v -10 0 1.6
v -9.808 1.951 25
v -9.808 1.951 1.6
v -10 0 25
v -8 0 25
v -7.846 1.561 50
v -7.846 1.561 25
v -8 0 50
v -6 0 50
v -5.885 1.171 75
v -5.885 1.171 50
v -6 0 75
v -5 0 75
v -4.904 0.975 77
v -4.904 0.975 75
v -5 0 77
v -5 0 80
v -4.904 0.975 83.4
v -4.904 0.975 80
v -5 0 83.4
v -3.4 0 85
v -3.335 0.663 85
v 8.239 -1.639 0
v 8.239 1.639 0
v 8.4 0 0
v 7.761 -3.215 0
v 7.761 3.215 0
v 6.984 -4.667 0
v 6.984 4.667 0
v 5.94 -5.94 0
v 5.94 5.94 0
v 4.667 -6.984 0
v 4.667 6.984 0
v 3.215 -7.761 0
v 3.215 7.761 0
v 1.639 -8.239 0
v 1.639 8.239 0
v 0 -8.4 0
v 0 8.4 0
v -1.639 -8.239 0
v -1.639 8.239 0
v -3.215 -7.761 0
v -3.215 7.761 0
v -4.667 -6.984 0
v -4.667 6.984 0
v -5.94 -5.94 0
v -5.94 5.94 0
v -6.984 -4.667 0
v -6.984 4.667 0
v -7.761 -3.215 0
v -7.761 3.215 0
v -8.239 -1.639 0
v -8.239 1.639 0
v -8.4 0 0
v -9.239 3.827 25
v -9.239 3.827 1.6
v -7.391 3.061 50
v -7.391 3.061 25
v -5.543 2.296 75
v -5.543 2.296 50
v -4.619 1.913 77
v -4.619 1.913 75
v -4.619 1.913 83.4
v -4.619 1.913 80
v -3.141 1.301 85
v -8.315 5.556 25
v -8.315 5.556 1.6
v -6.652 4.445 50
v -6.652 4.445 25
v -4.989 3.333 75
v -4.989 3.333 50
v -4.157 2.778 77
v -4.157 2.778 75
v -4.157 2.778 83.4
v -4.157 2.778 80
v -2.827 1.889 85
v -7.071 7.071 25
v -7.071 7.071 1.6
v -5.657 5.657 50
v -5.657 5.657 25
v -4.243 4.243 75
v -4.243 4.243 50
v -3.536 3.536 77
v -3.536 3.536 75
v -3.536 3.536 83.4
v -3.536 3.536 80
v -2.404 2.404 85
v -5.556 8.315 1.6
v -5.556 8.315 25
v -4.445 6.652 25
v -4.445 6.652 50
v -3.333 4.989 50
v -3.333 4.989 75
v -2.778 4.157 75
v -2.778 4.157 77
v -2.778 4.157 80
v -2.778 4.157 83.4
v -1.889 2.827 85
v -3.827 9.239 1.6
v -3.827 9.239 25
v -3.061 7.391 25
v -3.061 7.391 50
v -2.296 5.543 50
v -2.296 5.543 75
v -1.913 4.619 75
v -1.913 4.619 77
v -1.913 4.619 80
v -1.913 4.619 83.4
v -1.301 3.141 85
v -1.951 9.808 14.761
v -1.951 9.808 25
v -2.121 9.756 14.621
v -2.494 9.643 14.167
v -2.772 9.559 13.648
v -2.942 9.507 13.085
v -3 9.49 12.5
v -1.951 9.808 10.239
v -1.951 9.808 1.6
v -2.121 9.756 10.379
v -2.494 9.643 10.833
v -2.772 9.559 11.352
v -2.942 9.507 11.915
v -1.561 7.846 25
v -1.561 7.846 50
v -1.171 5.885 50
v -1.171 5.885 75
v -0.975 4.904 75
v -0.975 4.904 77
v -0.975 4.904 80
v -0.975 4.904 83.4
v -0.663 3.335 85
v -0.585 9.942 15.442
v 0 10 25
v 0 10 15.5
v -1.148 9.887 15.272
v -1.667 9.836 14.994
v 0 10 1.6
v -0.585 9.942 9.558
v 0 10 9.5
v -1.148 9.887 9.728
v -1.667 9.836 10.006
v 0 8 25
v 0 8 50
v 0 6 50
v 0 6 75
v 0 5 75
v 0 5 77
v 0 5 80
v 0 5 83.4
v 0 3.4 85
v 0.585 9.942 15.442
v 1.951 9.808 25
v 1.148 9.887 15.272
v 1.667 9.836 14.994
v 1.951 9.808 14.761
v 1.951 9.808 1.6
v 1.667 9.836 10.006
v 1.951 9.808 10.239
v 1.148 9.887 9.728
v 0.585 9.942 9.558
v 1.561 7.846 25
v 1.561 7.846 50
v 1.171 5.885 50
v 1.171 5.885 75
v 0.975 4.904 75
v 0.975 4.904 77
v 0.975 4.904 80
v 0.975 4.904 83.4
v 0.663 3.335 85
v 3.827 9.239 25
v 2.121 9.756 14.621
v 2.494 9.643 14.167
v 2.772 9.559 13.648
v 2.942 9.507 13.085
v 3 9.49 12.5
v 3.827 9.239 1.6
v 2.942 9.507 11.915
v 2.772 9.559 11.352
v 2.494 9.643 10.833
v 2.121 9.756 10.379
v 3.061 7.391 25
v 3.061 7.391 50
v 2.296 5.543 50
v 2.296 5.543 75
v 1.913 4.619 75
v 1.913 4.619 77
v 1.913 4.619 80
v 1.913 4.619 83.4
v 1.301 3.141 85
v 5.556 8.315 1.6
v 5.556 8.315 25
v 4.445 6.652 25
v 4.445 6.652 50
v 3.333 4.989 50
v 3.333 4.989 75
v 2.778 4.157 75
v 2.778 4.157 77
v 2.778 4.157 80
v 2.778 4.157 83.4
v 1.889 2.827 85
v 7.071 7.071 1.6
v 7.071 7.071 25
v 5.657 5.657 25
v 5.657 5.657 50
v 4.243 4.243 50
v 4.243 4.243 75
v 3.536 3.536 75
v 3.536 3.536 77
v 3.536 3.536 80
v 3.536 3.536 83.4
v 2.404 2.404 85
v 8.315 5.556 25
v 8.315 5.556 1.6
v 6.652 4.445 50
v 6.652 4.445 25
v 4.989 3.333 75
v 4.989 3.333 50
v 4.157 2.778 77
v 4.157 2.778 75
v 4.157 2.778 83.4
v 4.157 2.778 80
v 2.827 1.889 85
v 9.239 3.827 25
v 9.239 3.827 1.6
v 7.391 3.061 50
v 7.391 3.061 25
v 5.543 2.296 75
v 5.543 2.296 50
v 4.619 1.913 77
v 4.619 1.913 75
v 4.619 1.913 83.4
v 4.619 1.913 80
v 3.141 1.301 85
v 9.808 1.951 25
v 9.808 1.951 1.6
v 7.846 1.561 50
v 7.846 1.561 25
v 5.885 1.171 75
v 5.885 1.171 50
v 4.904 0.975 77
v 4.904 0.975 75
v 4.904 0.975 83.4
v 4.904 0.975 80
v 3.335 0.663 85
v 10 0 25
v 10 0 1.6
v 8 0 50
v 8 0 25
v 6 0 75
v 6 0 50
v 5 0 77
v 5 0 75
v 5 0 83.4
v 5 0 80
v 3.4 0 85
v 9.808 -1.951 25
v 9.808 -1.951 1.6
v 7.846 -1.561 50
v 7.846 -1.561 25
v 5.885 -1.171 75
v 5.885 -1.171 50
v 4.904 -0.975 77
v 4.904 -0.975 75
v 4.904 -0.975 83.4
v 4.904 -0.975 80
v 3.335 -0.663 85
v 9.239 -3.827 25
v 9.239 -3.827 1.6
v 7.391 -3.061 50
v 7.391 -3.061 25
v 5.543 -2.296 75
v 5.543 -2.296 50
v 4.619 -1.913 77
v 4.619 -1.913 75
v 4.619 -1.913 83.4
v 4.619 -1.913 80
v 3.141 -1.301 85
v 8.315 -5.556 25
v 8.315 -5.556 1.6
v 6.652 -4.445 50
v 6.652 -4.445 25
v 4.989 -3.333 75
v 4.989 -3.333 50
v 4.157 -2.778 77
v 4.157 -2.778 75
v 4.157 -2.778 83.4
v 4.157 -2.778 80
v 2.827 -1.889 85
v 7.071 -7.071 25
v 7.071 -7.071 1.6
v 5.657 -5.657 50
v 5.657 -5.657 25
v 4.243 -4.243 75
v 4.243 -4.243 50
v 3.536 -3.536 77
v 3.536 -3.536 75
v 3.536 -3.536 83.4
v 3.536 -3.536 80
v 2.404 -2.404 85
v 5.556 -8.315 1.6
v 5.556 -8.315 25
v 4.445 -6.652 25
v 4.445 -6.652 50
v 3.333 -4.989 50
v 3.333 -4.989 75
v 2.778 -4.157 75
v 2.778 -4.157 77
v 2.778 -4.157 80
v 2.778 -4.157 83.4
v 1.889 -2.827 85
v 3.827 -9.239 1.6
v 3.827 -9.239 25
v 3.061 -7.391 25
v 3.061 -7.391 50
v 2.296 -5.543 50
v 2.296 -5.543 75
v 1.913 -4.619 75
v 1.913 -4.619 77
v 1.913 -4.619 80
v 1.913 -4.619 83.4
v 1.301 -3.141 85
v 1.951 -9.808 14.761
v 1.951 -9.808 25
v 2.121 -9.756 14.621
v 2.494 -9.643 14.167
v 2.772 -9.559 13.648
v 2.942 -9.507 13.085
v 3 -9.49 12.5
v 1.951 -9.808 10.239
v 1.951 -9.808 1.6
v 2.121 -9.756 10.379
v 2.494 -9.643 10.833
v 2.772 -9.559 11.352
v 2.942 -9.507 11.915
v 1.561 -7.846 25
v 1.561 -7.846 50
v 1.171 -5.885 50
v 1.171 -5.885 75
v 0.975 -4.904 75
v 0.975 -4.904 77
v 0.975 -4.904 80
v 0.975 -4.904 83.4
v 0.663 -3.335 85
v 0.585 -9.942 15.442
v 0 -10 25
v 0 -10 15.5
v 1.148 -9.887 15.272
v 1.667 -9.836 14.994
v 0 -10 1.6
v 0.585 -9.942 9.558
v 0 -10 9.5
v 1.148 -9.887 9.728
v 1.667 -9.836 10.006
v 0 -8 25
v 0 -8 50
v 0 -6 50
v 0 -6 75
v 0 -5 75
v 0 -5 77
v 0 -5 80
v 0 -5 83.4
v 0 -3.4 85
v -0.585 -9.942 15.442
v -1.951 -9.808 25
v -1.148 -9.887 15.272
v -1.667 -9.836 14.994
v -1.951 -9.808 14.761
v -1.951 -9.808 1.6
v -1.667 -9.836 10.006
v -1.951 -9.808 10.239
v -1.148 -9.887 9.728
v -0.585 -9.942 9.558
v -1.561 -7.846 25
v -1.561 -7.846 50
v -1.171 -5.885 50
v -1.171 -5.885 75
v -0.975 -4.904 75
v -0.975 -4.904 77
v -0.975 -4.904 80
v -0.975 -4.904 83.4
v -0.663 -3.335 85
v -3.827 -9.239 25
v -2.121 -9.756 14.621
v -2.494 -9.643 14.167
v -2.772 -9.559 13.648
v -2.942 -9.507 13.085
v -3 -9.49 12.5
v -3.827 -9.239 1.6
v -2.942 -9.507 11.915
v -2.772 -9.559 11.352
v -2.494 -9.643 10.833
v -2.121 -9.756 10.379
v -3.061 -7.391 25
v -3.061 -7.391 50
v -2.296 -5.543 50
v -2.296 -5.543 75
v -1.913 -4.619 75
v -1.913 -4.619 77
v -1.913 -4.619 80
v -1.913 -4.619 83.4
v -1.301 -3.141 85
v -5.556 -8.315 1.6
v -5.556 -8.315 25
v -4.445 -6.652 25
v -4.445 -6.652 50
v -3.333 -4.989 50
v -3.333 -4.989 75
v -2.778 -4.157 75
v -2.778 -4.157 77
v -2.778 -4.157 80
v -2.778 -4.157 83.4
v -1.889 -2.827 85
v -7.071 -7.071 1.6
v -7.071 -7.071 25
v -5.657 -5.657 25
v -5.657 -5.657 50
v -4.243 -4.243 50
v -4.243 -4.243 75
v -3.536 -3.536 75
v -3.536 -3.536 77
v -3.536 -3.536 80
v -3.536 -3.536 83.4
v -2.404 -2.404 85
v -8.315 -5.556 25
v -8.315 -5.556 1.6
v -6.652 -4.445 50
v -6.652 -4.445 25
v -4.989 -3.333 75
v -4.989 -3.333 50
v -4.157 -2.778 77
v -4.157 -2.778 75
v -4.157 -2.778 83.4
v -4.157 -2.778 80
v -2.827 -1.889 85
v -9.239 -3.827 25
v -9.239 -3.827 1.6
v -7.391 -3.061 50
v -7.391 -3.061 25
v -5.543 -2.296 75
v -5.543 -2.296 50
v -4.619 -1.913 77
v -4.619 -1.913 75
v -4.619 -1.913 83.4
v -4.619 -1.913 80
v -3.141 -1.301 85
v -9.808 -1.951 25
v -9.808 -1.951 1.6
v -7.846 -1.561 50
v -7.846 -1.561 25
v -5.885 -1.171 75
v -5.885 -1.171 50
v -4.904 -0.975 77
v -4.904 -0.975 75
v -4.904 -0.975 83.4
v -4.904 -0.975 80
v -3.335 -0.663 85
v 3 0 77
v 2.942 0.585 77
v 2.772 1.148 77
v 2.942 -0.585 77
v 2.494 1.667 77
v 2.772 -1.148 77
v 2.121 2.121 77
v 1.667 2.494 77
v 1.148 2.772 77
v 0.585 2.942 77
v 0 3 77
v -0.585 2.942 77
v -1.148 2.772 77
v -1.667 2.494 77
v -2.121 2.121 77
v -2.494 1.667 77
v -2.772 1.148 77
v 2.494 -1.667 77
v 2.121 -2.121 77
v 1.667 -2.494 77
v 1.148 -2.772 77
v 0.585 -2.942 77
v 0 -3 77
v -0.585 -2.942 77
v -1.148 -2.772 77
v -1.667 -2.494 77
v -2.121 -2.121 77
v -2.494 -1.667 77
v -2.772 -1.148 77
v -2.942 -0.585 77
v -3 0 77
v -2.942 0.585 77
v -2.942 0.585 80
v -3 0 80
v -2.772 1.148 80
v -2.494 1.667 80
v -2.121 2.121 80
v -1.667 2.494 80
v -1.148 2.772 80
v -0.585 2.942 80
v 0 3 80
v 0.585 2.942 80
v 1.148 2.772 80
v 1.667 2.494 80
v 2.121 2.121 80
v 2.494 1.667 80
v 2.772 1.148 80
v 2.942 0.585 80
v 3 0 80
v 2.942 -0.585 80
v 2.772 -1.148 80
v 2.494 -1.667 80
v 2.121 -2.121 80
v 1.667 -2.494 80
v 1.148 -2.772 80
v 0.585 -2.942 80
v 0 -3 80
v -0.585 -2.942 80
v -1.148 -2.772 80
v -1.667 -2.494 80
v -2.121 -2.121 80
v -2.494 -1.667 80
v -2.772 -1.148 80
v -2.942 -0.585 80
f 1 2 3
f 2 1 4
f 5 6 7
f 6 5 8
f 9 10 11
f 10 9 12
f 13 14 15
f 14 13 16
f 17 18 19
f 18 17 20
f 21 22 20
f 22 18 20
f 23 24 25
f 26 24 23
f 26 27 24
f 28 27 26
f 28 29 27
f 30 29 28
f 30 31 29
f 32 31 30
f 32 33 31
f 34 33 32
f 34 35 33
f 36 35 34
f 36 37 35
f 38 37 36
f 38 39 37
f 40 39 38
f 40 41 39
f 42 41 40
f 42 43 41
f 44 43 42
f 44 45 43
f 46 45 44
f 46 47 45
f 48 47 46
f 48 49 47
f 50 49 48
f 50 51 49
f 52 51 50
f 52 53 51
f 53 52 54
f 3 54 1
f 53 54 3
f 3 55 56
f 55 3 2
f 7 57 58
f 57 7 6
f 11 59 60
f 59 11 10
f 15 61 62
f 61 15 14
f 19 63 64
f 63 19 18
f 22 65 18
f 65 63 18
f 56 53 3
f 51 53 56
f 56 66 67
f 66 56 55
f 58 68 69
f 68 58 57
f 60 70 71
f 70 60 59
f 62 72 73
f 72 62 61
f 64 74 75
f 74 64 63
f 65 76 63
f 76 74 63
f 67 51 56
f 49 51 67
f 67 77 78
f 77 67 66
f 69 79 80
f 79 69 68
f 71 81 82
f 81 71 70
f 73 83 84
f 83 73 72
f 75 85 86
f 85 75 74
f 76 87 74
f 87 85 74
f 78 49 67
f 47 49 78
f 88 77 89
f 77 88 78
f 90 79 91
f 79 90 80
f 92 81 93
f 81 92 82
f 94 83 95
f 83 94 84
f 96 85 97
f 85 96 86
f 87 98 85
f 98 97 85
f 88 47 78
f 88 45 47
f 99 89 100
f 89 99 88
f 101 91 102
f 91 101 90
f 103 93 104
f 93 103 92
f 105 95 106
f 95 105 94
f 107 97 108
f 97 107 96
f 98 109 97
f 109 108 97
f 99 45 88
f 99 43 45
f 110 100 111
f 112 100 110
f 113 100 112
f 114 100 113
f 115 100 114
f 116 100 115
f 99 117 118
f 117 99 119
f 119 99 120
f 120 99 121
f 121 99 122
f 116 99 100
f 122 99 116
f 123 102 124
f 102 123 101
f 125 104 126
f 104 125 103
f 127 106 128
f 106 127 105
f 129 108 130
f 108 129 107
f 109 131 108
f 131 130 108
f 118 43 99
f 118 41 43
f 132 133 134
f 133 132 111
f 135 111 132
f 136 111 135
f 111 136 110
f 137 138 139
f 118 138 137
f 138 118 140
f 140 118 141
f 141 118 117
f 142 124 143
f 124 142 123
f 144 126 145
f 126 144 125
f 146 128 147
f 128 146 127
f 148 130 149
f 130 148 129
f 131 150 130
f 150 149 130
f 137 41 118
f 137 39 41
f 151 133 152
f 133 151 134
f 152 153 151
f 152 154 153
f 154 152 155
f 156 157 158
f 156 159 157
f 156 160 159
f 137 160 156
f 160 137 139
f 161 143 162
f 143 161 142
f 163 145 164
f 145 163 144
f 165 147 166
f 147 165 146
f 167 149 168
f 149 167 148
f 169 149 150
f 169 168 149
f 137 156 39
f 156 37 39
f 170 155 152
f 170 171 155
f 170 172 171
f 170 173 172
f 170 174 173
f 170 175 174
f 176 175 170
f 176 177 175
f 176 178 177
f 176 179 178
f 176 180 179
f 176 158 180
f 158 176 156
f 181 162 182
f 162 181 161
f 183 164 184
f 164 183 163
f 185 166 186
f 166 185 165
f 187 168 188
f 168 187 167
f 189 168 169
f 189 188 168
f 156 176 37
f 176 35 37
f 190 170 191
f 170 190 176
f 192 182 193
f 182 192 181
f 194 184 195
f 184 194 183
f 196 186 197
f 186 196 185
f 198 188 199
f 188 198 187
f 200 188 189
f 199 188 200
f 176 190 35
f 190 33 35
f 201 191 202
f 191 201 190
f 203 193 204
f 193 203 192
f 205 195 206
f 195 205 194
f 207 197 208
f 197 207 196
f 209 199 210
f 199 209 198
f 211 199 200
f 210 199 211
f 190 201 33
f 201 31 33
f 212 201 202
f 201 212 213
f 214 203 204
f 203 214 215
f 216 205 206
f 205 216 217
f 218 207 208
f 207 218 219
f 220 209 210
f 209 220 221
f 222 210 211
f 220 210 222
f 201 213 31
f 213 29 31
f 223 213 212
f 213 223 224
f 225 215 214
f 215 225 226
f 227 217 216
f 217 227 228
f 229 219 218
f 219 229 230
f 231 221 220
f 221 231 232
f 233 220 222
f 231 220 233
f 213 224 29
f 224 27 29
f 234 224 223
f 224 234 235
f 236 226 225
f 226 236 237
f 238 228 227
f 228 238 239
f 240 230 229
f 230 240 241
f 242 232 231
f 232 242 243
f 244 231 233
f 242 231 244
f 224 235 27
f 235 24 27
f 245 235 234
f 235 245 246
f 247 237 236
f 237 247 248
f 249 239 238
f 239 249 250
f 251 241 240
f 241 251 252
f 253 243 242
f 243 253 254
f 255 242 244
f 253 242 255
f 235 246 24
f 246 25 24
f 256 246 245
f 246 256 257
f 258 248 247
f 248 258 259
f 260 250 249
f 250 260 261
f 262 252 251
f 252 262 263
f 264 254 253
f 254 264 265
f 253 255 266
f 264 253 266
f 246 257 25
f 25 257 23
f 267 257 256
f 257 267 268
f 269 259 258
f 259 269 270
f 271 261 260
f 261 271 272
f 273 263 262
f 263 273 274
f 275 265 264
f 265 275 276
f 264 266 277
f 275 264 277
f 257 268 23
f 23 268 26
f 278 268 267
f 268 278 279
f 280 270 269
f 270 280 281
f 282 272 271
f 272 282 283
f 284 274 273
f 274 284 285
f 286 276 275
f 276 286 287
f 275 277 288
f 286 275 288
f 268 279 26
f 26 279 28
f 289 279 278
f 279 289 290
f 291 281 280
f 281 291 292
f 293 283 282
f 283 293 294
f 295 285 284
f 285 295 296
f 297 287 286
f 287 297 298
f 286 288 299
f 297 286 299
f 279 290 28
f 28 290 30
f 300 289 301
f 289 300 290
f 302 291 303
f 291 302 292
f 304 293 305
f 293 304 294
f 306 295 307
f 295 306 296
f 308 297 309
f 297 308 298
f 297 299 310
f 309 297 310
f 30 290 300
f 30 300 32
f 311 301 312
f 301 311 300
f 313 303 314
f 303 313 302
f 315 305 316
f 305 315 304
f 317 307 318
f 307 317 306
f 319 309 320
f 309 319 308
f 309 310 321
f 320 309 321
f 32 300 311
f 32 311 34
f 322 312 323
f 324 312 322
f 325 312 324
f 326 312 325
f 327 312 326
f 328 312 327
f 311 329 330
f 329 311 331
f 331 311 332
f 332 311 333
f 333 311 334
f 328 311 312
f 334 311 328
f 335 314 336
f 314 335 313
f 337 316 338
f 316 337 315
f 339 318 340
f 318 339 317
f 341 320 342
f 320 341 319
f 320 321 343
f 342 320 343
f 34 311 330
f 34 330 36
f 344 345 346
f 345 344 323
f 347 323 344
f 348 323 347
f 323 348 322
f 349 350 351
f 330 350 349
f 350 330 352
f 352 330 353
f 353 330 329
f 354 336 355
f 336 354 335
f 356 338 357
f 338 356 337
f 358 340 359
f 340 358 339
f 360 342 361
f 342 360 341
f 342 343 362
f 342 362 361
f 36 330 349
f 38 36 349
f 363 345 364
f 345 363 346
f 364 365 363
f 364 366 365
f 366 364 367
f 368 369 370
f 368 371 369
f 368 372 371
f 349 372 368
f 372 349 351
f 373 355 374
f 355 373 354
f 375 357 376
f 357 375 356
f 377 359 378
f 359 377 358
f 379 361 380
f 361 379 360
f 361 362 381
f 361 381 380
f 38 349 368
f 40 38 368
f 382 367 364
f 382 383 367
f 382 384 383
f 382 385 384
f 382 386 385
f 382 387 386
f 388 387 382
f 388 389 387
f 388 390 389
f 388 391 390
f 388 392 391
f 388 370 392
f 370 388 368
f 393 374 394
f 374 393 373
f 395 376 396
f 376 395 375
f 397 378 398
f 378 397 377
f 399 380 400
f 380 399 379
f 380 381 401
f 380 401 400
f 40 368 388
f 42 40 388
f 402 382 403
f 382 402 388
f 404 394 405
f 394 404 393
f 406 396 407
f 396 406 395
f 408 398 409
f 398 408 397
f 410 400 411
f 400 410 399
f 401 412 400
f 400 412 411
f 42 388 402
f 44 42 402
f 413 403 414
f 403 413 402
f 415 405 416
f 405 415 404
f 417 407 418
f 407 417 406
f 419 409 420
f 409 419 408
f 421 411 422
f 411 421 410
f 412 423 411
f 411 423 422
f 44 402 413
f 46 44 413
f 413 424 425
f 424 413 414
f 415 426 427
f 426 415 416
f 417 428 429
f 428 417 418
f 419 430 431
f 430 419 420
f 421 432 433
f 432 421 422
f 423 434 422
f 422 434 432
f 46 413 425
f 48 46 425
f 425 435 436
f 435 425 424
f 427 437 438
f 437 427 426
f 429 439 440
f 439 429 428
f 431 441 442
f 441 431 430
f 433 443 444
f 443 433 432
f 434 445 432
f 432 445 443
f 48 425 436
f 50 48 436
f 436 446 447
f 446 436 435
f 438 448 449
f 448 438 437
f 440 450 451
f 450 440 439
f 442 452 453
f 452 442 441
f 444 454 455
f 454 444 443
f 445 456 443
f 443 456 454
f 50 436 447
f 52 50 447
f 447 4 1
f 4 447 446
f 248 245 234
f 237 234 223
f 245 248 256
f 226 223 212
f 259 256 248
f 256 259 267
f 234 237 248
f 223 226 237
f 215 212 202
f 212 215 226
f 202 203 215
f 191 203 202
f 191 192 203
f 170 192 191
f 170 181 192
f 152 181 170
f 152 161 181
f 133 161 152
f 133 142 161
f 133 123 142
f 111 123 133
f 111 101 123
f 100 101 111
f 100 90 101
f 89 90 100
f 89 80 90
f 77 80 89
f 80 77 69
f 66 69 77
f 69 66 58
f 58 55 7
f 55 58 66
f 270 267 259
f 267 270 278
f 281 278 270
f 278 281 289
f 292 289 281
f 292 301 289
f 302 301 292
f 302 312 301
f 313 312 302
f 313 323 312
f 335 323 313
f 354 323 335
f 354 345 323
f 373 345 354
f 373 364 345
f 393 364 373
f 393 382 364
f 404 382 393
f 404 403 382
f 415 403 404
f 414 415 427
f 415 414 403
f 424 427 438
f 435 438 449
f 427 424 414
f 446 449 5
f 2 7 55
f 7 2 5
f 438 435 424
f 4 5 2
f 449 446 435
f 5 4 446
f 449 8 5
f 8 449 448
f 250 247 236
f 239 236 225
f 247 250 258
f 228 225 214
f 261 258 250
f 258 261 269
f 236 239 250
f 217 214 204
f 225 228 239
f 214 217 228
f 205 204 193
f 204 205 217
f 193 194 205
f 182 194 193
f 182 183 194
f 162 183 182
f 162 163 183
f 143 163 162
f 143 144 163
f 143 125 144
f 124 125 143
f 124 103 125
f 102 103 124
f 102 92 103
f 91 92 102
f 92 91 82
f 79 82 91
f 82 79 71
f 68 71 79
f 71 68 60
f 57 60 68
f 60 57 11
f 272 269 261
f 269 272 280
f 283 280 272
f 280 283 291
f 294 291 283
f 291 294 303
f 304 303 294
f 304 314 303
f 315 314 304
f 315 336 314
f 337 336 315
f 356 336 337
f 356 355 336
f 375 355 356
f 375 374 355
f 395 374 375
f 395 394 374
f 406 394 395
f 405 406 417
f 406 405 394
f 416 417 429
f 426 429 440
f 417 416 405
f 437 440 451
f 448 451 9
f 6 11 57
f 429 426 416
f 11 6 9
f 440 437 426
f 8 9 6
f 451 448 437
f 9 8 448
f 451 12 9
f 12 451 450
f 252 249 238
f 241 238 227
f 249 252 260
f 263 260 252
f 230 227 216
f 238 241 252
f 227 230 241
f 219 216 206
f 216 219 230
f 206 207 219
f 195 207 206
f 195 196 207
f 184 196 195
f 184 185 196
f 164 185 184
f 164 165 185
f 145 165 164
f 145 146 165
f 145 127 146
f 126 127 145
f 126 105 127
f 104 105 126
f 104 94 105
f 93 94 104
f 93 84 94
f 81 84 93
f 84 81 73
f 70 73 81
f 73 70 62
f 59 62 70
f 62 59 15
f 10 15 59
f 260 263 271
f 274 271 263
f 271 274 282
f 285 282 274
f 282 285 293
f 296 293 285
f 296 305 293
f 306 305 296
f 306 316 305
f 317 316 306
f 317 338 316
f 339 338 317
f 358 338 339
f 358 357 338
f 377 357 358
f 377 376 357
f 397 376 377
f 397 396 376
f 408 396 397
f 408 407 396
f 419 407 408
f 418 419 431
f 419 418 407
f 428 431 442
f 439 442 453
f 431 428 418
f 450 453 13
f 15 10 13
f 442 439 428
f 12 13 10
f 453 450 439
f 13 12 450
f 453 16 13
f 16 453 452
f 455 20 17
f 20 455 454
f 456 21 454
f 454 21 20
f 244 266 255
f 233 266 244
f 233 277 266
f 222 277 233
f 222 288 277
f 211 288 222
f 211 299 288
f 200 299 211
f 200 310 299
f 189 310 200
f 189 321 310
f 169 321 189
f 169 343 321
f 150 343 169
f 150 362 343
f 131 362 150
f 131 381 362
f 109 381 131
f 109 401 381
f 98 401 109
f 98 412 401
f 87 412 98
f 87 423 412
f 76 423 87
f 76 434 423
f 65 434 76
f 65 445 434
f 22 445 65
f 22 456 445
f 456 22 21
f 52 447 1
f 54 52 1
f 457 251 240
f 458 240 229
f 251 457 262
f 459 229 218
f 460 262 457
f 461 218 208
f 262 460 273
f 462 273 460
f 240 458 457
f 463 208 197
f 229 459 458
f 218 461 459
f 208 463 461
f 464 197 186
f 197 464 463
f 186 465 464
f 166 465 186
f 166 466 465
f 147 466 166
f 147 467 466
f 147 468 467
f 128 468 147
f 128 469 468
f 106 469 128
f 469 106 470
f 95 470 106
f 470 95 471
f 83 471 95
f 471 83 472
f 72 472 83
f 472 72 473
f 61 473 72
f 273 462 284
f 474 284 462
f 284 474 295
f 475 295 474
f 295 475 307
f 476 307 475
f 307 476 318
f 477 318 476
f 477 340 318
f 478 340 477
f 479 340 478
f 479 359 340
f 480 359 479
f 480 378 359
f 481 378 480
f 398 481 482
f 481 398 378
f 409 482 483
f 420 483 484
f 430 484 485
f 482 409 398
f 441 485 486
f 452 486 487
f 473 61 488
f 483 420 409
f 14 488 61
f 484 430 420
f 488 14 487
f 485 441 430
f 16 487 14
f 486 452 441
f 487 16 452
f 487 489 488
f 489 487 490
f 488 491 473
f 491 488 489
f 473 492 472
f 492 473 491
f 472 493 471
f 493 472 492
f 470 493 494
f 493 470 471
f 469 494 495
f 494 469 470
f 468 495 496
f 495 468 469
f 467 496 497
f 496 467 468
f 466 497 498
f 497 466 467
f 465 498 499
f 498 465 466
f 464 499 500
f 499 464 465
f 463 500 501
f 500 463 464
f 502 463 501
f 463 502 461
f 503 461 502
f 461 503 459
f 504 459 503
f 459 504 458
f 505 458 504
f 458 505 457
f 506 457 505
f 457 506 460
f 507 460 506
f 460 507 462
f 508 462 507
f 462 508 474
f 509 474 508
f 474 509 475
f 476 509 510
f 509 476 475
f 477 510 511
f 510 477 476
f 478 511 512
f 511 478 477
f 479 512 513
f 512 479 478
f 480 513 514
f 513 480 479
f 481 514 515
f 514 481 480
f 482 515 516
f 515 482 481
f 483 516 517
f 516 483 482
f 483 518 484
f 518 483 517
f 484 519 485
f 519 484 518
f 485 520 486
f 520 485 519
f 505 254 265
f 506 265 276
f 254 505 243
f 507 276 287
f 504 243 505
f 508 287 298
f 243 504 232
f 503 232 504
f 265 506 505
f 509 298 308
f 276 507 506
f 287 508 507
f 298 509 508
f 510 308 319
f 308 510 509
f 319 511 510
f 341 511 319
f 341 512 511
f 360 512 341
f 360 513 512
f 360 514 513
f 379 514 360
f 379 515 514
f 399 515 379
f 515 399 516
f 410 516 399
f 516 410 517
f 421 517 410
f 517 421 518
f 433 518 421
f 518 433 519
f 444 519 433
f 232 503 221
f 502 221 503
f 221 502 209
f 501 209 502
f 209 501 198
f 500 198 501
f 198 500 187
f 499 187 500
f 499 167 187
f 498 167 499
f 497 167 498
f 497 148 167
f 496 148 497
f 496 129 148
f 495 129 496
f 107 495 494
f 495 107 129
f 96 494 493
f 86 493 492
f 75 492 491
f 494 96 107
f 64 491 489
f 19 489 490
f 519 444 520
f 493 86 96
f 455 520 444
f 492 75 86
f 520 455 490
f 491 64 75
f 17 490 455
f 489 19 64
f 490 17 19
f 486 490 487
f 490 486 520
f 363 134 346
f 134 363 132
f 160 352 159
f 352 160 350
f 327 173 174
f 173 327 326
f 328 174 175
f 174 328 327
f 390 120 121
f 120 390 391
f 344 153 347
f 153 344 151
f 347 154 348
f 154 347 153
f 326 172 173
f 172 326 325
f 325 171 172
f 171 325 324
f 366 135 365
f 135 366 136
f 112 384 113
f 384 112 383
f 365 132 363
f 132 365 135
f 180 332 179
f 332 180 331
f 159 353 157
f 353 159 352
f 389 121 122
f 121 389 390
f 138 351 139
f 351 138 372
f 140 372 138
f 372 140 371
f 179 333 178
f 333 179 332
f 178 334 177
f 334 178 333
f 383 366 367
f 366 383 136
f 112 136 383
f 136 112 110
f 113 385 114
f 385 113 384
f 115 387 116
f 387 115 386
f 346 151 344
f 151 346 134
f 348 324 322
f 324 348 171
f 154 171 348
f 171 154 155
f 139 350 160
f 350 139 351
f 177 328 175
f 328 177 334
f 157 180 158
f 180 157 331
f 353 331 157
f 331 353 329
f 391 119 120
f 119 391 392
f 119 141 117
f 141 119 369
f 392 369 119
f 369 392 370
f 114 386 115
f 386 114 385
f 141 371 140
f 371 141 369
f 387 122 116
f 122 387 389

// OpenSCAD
$fn = 32;

// ----------------------------------------------------------------------
// Stepped shaft: diameters 20, 16, 12, 10 mm, 85 mm long
// ----------------------------------------------------------------------

// --- parameters (mm) ---
d1 = 20;                  // step 1 diameter
len1 = 25;                // step 1 length
d2 = 16;                  // step 2 diameter
len2 = 25;                // step 2 length
d3 = 12;                  // step 3 diameter
len3 = 25;                // step 3 length
d4 = 10;                  // step 4 diameter
len4 = 10;                // step 4 length
total = 85;               // overall length
chamfer = 1.6;            // end chamfer
groove_r = 5;             // groove radius
groove_z = 77;            // groove position from the end
groove_w = 3;             // groove width
groove_d = 2;             // groove depth
key_w = 6;                // keyway width
key_d = 3;                // keyway depth
key_len = 19;             // keyway length
key_z = 63;               // keyway start along the shaft
cross_d = 6;              // cross pin hole
cross_z = 12.5;           // cross hole position

/* closed turning profile: x is the radius, y is the length */
profile = [[0, 0], [10 - chamfer, 0], [10, chamfer], [10, 25], [8, 25], [8, 50], [6, 50], [6, 75], [5, 75], [5, 83.4], [3.4, 85], [0, 85]];

difference() {
  rotate_extrude() polygon(profile);
  /* circlip groove just behind the shoulder */
  rotate_extrude() translate([groove_r - groove_d, groove_z]) square([groove_d + 1, groove_w]);
  /* keyway milled into the top of the largest step */
  translate([d1 / 2 - key_d, -key_w / 2, key_z]) cube([key_d + 1, key_w, key_len]);
  /* cross pin hole through the small step */
  translate([0, 0, cross_z]) rotate([90, 0, 0]) cylinder(h = d1 + 4, d = cross_d, center = true);
}
